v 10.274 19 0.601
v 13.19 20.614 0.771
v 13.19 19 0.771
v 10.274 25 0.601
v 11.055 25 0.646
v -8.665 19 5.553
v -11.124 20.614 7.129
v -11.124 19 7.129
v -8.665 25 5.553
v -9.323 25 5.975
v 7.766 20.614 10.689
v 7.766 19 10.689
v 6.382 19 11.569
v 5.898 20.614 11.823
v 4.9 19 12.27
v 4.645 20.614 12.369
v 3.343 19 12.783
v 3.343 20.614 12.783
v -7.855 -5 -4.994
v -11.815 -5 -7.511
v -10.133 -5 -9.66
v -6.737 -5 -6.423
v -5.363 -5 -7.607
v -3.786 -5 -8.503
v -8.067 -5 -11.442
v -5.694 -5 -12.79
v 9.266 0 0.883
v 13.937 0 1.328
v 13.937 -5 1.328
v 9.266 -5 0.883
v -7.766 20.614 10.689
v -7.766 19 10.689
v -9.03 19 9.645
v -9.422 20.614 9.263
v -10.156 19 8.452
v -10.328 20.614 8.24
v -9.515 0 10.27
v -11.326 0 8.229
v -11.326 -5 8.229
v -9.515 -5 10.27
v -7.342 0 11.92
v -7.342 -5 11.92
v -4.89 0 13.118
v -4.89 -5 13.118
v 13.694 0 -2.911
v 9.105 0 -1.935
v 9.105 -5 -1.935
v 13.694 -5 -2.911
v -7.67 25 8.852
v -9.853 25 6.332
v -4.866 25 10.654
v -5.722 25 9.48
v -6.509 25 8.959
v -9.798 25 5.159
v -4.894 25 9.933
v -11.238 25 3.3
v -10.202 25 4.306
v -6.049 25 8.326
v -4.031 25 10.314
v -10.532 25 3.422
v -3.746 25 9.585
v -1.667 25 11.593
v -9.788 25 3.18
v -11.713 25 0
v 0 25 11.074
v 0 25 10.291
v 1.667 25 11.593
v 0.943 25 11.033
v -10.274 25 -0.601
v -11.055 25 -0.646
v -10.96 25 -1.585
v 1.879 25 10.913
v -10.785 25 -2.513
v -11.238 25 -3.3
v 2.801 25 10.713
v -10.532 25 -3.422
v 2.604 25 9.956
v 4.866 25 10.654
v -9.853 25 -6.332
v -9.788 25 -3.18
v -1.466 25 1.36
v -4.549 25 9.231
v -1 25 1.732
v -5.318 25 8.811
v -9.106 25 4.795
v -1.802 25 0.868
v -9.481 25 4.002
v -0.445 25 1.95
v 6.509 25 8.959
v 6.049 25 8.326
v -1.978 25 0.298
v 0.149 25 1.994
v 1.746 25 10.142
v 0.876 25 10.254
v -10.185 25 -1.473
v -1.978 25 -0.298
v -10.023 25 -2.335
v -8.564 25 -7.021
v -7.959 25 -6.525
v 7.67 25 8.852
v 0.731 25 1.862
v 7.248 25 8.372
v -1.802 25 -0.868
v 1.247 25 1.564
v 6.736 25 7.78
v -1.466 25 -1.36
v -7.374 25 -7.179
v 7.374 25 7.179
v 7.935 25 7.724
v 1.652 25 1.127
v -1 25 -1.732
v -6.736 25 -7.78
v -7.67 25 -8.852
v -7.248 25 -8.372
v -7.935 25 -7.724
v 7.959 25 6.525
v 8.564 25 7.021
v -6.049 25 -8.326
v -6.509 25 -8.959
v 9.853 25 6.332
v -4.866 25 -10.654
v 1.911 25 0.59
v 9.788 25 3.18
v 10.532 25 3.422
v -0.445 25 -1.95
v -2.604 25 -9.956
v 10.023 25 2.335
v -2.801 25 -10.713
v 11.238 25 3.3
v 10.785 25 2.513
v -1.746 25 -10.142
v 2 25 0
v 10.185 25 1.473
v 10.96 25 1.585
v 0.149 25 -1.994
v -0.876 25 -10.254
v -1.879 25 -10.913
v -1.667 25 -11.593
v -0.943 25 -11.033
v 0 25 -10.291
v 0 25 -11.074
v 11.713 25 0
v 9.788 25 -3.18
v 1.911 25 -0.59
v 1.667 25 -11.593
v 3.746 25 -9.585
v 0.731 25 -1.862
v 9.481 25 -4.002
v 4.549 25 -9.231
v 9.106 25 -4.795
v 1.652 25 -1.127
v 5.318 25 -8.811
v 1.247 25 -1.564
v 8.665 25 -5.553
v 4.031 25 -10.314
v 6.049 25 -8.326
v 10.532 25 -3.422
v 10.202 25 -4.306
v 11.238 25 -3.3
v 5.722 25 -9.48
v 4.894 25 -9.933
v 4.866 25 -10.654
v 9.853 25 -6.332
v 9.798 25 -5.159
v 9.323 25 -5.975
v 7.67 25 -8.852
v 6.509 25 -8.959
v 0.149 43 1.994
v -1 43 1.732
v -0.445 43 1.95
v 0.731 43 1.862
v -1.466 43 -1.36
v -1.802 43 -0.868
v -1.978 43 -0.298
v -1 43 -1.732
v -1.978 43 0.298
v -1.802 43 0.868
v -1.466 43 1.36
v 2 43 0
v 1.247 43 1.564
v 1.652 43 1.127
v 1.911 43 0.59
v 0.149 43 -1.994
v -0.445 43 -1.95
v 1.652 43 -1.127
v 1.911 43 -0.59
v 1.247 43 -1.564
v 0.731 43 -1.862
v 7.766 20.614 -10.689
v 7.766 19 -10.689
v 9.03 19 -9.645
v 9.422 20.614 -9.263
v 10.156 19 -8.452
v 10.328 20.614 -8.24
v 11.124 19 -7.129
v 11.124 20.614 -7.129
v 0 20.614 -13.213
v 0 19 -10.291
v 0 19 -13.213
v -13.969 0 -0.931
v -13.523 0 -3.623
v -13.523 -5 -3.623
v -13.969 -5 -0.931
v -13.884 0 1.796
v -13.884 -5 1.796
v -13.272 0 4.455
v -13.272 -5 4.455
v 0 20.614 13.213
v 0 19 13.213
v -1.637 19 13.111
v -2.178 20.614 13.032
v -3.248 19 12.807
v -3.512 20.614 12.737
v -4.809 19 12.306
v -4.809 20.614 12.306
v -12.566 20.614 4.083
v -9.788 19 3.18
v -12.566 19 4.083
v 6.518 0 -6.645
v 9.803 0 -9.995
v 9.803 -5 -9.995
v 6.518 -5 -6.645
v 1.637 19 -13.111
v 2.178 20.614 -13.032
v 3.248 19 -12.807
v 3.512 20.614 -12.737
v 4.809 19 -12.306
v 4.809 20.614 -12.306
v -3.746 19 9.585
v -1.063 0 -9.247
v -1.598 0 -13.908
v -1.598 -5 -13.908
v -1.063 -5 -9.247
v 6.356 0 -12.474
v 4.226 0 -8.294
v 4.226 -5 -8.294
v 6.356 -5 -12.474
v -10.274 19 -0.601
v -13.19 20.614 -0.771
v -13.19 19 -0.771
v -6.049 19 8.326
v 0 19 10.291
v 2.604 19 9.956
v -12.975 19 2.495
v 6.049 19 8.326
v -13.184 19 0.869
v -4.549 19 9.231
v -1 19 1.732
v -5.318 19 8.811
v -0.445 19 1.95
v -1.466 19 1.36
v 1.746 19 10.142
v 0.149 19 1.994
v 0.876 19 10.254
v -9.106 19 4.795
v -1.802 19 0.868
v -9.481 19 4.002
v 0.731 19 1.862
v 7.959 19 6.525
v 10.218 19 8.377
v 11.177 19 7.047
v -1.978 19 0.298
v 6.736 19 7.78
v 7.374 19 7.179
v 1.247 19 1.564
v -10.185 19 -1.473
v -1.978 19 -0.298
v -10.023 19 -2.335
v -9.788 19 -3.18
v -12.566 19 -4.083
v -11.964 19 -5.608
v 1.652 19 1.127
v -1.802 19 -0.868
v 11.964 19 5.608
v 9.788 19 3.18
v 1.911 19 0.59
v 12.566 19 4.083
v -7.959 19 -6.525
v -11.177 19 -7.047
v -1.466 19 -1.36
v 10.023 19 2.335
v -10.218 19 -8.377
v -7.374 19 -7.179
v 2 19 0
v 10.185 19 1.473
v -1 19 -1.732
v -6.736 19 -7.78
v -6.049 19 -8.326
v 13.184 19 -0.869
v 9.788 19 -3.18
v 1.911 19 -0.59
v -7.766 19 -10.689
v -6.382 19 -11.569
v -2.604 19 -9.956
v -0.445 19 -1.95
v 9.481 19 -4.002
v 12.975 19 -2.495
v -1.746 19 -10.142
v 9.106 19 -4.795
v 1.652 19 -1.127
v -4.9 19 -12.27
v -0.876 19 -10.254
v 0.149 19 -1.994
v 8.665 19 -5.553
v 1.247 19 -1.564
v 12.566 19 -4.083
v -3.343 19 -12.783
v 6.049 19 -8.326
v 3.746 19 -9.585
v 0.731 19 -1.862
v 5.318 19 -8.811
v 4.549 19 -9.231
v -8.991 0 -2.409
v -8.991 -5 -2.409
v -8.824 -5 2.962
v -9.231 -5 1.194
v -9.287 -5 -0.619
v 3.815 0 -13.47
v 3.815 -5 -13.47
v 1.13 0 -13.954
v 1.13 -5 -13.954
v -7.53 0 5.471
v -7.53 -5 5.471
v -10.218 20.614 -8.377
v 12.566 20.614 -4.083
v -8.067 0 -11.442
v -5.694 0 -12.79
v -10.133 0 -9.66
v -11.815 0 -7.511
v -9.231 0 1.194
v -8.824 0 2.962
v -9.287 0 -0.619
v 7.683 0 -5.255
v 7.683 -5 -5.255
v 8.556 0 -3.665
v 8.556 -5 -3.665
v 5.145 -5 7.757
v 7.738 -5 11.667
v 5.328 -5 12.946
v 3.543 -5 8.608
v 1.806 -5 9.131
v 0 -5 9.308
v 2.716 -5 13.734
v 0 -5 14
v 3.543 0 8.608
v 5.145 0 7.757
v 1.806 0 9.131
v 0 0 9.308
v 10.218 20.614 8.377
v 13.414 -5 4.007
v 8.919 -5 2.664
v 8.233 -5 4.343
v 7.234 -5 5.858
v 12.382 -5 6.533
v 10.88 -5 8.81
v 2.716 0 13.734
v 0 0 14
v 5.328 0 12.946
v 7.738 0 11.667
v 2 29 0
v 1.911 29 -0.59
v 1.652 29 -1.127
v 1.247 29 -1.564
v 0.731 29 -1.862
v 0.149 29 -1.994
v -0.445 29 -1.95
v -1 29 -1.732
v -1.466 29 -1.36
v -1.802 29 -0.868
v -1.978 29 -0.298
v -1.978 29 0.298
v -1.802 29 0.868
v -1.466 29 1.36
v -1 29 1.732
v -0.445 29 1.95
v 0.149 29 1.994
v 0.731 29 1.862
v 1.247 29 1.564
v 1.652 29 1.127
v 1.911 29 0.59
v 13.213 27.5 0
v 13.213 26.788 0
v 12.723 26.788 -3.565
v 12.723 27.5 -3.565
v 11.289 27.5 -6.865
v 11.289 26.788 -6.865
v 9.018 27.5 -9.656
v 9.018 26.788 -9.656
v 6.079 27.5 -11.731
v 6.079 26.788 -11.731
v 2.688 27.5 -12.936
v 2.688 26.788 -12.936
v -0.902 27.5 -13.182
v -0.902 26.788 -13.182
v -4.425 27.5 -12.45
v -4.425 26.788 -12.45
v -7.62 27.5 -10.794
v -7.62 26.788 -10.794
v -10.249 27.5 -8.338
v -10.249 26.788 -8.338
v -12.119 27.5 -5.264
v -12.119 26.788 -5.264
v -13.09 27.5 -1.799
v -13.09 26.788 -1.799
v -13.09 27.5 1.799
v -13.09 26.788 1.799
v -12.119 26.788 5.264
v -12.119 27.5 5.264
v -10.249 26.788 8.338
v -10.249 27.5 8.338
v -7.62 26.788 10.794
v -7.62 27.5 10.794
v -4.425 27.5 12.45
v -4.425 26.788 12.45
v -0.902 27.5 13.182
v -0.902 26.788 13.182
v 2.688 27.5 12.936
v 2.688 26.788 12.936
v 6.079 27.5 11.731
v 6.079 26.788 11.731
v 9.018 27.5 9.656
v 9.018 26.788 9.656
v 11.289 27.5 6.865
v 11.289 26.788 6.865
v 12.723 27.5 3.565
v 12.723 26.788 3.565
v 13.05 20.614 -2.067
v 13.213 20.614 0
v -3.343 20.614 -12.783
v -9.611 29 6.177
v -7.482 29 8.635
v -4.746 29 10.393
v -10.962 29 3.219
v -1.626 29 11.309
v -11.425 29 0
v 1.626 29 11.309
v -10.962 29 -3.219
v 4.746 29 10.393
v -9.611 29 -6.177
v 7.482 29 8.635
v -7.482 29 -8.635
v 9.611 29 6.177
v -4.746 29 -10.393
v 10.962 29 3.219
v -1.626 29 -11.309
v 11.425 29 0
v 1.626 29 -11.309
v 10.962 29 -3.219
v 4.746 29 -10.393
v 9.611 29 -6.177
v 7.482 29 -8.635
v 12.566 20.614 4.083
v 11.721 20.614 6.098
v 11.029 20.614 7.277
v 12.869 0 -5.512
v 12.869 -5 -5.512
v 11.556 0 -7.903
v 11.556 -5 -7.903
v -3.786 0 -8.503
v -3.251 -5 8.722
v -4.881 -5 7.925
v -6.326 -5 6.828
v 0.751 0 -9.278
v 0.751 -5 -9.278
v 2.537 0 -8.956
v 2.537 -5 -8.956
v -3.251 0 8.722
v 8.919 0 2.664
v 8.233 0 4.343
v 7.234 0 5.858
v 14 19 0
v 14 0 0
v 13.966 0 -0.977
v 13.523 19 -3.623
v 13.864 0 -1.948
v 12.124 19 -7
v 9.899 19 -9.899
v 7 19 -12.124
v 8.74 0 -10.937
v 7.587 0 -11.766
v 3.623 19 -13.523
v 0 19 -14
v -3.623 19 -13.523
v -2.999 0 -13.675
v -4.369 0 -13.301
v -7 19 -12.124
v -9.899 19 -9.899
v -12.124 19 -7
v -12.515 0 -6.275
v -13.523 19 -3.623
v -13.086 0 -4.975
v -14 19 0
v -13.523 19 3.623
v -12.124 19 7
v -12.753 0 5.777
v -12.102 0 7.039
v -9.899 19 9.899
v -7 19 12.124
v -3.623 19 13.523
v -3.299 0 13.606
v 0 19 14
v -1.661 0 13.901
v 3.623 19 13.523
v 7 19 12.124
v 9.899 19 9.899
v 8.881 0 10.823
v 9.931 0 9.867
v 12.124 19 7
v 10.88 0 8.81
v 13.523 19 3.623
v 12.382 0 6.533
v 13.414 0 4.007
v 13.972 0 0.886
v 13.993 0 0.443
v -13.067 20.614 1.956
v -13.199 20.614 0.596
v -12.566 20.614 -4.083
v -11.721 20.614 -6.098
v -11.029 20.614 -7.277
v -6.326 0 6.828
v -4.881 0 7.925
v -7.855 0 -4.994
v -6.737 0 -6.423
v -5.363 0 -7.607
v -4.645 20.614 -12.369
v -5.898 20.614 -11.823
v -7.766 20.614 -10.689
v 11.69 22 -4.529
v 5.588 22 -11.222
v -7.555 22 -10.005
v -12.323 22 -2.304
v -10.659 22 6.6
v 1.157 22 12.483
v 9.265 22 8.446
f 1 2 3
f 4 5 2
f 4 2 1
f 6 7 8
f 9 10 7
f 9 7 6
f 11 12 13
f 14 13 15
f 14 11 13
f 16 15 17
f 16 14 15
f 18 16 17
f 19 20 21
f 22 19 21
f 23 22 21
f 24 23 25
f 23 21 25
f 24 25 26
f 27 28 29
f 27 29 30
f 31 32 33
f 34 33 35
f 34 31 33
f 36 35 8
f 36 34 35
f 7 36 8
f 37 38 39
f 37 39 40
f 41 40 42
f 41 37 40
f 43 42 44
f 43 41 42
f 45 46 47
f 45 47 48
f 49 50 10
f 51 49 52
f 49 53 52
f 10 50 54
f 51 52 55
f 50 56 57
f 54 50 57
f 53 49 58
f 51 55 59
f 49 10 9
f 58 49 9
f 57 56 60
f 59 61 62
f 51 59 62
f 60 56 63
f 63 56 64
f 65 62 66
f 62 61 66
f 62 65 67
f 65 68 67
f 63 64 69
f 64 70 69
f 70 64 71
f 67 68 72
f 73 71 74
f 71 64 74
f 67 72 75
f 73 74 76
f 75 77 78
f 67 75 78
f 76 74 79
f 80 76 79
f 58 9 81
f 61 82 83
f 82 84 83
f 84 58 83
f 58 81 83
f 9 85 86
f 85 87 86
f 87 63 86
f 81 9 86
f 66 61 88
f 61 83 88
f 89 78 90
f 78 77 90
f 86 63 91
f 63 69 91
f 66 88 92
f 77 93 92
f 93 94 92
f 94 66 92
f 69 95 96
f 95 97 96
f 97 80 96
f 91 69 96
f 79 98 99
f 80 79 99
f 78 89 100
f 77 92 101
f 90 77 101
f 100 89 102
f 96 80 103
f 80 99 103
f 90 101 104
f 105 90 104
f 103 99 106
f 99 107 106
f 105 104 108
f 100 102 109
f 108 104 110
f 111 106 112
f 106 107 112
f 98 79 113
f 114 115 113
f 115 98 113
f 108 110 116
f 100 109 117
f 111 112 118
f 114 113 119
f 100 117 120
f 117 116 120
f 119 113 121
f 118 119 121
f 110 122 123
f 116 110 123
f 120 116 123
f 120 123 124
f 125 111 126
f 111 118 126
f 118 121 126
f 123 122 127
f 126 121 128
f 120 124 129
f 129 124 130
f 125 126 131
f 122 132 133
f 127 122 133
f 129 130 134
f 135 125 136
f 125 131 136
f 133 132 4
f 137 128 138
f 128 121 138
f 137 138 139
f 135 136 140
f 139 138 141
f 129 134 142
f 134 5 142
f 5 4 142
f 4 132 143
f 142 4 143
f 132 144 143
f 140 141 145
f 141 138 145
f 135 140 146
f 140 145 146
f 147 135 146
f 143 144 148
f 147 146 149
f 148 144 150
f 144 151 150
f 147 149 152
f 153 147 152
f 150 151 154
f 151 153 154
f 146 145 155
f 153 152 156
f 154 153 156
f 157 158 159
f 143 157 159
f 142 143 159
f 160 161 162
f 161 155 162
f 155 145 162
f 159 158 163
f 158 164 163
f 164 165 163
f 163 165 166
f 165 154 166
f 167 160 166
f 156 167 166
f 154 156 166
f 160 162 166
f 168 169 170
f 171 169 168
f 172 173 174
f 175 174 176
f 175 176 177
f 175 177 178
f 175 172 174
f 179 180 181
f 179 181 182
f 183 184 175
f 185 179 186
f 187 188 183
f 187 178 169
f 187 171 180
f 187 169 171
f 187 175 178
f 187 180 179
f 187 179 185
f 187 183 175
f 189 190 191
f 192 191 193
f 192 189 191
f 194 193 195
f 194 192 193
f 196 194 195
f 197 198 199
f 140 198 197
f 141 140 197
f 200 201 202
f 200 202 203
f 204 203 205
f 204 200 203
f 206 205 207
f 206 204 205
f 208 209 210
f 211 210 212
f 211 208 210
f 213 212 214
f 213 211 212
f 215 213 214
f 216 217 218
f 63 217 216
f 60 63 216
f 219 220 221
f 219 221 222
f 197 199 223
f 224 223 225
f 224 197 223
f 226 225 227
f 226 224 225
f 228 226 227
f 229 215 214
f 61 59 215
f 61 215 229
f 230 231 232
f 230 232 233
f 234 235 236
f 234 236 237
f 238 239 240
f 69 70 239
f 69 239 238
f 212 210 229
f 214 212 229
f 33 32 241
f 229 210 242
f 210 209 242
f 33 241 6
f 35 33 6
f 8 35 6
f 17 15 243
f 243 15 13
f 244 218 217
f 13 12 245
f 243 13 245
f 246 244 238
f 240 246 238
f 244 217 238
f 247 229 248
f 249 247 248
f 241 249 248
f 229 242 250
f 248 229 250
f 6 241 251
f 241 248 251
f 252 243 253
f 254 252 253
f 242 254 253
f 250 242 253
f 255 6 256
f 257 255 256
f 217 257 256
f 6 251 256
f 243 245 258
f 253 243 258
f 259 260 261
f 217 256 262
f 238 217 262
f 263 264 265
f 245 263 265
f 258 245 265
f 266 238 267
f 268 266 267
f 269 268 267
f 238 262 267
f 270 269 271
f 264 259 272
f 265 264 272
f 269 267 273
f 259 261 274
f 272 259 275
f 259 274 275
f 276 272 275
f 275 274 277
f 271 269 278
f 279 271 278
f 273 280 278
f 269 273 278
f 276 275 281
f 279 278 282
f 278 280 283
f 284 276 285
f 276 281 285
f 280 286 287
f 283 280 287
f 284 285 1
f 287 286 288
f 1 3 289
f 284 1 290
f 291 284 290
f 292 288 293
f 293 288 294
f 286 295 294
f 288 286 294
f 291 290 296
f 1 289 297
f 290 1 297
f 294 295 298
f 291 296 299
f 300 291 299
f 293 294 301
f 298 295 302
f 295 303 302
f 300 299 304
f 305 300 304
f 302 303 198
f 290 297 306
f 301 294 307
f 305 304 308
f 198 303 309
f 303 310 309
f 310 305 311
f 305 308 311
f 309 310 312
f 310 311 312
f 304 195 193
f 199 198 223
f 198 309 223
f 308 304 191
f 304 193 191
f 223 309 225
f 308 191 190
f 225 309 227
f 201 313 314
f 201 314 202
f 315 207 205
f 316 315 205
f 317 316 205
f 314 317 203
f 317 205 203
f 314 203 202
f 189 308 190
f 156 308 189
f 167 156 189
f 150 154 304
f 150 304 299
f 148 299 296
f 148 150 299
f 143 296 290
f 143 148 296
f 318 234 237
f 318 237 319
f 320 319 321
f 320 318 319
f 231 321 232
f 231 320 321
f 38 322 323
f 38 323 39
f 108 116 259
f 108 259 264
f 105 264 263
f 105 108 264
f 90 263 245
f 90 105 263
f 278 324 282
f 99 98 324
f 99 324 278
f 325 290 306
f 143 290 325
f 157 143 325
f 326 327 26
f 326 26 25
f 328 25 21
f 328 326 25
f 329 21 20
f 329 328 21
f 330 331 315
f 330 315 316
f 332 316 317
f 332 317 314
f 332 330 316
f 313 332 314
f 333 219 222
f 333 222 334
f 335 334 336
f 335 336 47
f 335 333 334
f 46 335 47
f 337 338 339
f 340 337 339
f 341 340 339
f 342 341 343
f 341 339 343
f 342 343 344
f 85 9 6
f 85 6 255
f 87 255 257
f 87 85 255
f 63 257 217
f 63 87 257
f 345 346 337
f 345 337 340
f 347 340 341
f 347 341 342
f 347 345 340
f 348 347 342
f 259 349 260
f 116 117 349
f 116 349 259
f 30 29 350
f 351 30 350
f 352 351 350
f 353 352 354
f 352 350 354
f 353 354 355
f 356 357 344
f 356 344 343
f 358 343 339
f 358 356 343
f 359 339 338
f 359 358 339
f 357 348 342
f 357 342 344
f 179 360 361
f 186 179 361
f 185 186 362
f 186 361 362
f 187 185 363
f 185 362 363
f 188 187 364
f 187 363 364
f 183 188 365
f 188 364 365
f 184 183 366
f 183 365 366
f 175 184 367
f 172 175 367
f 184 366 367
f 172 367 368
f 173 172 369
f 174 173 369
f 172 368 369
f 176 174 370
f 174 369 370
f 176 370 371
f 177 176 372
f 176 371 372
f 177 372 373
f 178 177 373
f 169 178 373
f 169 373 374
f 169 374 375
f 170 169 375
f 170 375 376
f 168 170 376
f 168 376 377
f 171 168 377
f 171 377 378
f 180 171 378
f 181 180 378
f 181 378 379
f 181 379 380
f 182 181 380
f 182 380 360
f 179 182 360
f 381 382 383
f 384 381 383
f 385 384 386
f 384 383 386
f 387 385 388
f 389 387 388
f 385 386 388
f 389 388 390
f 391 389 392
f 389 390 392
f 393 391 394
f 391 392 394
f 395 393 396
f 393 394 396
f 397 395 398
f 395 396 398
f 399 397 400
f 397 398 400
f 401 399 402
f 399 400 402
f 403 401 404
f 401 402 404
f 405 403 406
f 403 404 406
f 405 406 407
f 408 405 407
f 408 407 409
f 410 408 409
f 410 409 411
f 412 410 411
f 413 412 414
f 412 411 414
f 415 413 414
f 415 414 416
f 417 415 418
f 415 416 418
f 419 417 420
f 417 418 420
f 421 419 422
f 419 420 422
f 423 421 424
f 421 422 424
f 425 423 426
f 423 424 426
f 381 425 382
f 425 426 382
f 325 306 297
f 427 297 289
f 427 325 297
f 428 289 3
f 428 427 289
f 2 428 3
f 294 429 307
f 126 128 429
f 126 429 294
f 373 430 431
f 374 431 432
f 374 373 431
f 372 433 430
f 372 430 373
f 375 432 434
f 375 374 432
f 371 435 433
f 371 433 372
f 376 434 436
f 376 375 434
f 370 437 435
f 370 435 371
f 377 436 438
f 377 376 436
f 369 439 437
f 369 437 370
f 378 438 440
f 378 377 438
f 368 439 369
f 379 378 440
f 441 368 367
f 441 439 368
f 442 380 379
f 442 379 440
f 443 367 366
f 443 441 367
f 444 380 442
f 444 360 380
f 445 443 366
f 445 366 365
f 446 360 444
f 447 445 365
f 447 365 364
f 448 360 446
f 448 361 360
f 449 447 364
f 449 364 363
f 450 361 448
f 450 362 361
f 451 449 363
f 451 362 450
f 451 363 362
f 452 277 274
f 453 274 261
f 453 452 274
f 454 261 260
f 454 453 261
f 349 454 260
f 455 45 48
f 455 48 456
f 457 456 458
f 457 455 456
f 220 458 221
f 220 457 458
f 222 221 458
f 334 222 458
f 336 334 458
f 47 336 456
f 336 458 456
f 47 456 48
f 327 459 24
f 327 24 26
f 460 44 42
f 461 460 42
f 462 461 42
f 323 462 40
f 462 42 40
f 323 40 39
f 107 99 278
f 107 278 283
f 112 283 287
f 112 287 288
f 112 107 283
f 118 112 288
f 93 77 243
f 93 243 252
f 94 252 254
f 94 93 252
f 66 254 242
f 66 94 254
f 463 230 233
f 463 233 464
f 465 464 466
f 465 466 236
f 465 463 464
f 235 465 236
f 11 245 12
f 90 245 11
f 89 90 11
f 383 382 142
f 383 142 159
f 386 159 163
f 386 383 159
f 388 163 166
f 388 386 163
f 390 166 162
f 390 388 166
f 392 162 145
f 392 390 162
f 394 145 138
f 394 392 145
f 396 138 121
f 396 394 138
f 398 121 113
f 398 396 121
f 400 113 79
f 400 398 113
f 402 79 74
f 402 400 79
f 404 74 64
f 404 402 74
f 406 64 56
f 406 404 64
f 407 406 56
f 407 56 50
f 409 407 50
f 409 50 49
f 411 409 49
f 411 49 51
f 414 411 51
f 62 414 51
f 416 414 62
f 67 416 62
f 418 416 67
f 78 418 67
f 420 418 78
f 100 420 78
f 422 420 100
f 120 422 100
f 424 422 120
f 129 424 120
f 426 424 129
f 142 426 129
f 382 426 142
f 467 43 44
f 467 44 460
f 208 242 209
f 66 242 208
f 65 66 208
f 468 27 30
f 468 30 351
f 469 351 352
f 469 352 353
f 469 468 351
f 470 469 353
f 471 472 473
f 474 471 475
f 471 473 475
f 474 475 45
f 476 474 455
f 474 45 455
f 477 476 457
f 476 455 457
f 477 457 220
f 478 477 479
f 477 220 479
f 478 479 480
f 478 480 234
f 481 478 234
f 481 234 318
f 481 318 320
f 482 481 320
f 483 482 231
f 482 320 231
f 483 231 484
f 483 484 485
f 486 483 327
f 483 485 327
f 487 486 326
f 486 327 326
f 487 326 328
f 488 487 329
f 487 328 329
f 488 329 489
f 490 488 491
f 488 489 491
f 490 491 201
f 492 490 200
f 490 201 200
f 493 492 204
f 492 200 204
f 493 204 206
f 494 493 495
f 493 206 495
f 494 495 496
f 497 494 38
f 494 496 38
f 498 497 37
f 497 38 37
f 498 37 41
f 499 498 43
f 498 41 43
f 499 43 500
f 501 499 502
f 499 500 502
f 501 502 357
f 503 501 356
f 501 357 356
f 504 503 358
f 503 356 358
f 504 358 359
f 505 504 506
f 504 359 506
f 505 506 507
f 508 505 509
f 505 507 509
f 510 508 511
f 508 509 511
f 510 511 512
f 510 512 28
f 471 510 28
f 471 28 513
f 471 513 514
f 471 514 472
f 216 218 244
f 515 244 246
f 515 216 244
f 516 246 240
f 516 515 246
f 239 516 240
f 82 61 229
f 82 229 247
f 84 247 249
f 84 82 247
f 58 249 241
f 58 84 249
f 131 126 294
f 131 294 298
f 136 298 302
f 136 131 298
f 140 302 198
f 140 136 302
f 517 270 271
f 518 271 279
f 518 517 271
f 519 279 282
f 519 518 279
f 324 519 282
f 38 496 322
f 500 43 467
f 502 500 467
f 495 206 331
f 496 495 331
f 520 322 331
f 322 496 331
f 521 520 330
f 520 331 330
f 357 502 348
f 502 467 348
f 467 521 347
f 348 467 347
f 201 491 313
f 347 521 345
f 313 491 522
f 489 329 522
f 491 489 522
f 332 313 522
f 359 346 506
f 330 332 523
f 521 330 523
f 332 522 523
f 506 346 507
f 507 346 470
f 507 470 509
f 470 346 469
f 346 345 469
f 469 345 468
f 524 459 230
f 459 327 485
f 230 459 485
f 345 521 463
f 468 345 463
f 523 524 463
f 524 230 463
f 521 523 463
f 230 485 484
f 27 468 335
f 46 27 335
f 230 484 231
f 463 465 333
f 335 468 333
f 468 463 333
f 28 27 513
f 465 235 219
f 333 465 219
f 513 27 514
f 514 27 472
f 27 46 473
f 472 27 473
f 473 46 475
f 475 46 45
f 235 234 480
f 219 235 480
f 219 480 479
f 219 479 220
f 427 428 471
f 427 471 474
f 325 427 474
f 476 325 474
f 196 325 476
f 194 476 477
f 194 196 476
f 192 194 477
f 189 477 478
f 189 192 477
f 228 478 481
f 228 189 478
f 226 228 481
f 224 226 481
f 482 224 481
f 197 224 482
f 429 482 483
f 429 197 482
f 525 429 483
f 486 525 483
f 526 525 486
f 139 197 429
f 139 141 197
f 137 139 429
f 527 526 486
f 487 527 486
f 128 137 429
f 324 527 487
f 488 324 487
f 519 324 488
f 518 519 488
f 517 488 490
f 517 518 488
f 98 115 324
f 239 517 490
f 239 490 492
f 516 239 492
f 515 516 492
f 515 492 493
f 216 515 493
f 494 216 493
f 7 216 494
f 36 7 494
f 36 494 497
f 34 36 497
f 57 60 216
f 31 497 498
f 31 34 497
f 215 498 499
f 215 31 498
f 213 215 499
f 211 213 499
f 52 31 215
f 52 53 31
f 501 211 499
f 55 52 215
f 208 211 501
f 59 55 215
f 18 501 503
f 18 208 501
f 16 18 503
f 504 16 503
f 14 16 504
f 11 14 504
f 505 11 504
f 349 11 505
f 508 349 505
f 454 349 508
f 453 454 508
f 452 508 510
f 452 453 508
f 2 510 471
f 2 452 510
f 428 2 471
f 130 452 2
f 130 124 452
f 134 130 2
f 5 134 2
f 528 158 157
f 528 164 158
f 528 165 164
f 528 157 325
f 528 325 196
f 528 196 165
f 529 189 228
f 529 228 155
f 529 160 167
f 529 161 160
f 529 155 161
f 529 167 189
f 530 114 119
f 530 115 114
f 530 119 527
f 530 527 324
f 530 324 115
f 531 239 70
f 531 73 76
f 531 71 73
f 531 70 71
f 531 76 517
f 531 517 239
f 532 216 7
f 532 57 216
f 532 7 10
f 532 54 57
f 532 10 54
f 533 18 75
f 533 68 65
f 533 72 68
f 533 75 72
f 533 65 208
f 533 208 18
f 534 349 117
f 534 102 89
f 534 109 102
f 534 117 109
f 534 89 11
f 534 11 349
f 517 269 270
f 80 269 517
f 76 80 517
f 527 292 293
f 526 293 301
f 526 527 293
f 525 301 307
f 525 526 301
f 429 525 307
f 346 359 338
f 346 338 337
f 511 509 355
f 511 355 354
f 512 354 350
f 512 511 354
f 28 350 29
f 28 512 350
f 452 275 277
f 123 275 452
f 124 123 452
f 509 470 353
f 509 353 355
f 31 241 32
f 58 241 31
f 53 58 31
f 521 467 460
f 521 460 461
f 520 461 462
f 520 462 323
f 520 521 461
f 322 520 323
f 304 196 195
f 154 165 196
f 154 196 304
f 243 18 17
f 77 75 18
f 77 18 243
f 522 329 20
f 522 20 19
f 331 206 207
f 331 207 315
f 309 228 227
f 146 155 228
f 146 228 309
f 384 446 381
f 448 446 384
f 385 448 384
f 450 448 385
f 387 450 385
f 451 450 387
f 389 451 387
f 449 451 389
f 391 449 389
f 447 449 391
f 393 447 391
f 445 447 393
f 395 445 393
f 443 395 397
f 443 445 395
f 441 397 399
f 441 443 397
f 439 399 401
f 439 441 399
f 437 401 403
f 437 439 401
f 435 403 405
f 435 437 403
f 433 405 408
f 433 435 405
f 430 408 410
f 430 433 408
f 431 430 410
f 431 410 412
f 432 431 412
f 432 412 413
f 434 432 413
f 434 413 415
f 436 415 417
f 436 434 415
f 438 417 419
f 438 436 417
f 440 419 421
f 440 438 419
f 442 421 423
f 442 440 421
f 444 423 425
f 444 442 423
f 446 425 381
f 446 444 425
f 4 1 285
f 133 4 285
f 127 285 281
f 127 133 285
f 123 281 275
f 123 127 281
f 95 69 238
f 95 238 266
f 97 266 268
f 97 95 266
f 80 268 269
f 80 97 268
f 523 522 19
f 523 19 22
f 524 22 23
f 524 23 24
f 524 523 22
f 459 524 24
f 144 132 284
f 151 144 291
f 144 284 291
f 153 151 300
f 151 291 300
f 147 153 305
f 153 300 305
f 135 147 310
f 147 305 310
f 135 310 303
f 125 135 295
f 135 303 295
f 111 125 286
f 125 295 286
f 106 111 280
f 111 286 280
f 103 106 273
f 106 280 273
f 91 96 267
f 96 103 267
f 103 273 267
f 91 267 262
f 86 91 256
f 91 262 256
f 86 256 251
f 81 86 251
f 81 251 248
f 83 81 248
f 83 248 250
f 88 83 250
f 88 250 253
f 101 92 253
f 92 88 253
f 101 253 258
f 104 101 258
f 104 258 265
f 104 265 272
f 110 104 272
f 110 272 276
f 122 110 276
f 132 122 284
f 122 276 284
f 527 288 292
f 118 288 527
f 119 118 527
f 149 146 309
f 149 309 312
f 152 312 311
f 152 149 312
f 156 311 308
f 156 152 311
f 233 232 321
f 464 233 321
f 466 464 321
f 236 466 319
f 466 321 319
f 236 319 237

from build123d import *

# Parameters (mm, degrees)
SKETCH1_R             = 14
BOSS_EXTRUDE1_DEPTH   = 25
CHAMFER1_SIZE         = 6
CHAMFER1_SIZE2        = 2.926395531
CUT_EXTRUDE1_DEPTH    = 6
CIRPATTERN1_COUNT     = 10
SKETCH3_R             = 13.212713
BOSS_EXTRUDE2_DEPTH   = 4
CHAMFER2_SIZE         = 1.5
CHAMFER2_SIZE2        = 1.787630389
CHAMFER2_PART_2_SIZE  = 1.5
CHAMFER2_PART_2_SIZE2 = 1.787630389
SKETCH4_R             = 2
BOSS_EXTRUDE3_DEPTH   = 24
BOSS_EXTRUDE4_DEPTH   = 5
CIRPATTERN2_COUNT     = 7
CIRPATTERN2_ANGLE     = 306


with BuildPart() as part:
    # Sketch1 → Boss-Extrude1 (new body)
    with BuildSketch(Plane(origin=(0, 0, 0), x_dir=(1, 0, 0), z_dir=(0, 1, 0))):
        Circle(SKETCH1_R)
    extrude(amount=BOSS_EXTRUDE1_DEPTH)

    # Chamfer1
    chamfer1_edges = [part.edges().sort_by_distance(p)[0] for p in [
        (-14, 25, 0),
    ]]
    chamfer1_side = [part.faces().sort_by_distance(p)[0] for p in [
        (-14, 12.5, 0),
    ]]
    chamfer(chamfer1_edges, length=CHAMFER1_SIZE, length2=CHAMFER1_SIZE2, reference=chamfer1_side[0])

    # Sketch2 → Cut-Extrude1 (cut)
    with BuildSketch(Plane(origin=(0, 25, 0), x_dir=(1, 0, 0), z_dir=(0, 1, 0))):
        with BuildLine():
            Line((0, 10.291206374), (0, 13.212713))
            ThreePointArc((0, 13.212713), (2.447017171, 12.98414001), (4.80937012, 12.306329423))
            Line((4.80937012, 12.306329423), (3.745954402, 9.585236265))
            ThreePointArc((3.745954402, 9.585236265), (-1.905949119, -10.113173913), (0, 10.291206374))
        make_face()
    cut_extrude1 = extrude(amount=-CUT_EXTRUDE1_DEPTH, mode=Mode.SUBTRACT)

    # CirPattern1: Cut-Extrude1 ×10 about axis
    cirpattern1_axis = Axis((0, 0, 0), (0, 1, 0))
    for i in range(1, CIRPATTERN1_COUNT):
        add(cut_extrude1.rotate(cirpattern1_axis, i * 360 / CIRPATTERN1_COUNT), mode=Mode.SUBTRACT)

    # Sketch3 → Boss-Extrude2 (add)
    with BuildSketch(Plane(origin=(0, 25, 0), x_dir=(1, 0, 0), z_dir=(0, 1, 0))):
        Circle(SKETCH3_R)
    extrude(amount=BOSS_EXTRUDE2_DEPTH)

    # Chamfer2
    chamfer2_edges = [part.edges().sort_by_distance(p)[0] for p in [
        (-13.212713, 25, 0),
    ]]
    chamfer2_side = [part.faces().sort_by_distance(p)[0] for p in [
        (0, 25, 0),
    ]]
    chamfer(chamfer2_edges, length=CHAMFER2_SIZE, length2=CHAMFER2_SIZE2, reference=chamfer2_side[0])

    # Chamfer2 part 2
    chamfer2_part_2_edges = [part.edges().sort_by_distance(p)[0] for p in [
        (-13.212713, 29, 0),
    ]]
    chamfer2_part_2_side = [part.faces().sort_by_distance(p)[0] for p in [
        (-13.212713, 27, 0),
    ]]
    chamfer(chamfer2_part_2_edges, length=CHAMFER2_PART_2_SIZE, length2=CHAMFER2_PART_2_SIZE2, reference=chamfer2_part_2_side[0])

    # Sketch4 → Boss-Extrude3 (add)
    with BuildSketch(Plane(origin=(0, 19, 0), x_dir=(1, 0, 0), z_dir=(0, 1, 0))):
        Circle(SKETCH4_R)
    extrude(amount=BOSS_EXTRUDE3_DEPTH)

    # Sketch5 → Boss-Extrude4 (add)
    with BuildSketch(Plane.XZ):
        with BuildLine():
            Line((0, 9.308060502), (0, 14))
            ThreePointArc((0, 14), (4.041174246, 13.404063217), (7.738307866, 11.666987245))
            Line((7.738307866, 11.666987245), (5.1449027, 7.756930225))
            ThreePointArc((5.1449027, 7.756930225), (2.686821027, 8.911845099), (0, 9.308060502))
        make_face()
    boss_extrude4 = extrude(amount=BOSS_EXTRUDE4_DEPTH)

    # CirPattern2: Boss-Extrude4 ×7 about axis
    cirpattern2_axis = Axis((0, 0, 0), (0, 1, 0))
    for i in range(1, CIRPATTERN2_COUNT):
        add(boss_extrude4.rotate(cirpattern2_axis, i * CIRPATTERN2_ANGLE / (CIRPATTERN2_COUNT - 1)))


solid = part.part
